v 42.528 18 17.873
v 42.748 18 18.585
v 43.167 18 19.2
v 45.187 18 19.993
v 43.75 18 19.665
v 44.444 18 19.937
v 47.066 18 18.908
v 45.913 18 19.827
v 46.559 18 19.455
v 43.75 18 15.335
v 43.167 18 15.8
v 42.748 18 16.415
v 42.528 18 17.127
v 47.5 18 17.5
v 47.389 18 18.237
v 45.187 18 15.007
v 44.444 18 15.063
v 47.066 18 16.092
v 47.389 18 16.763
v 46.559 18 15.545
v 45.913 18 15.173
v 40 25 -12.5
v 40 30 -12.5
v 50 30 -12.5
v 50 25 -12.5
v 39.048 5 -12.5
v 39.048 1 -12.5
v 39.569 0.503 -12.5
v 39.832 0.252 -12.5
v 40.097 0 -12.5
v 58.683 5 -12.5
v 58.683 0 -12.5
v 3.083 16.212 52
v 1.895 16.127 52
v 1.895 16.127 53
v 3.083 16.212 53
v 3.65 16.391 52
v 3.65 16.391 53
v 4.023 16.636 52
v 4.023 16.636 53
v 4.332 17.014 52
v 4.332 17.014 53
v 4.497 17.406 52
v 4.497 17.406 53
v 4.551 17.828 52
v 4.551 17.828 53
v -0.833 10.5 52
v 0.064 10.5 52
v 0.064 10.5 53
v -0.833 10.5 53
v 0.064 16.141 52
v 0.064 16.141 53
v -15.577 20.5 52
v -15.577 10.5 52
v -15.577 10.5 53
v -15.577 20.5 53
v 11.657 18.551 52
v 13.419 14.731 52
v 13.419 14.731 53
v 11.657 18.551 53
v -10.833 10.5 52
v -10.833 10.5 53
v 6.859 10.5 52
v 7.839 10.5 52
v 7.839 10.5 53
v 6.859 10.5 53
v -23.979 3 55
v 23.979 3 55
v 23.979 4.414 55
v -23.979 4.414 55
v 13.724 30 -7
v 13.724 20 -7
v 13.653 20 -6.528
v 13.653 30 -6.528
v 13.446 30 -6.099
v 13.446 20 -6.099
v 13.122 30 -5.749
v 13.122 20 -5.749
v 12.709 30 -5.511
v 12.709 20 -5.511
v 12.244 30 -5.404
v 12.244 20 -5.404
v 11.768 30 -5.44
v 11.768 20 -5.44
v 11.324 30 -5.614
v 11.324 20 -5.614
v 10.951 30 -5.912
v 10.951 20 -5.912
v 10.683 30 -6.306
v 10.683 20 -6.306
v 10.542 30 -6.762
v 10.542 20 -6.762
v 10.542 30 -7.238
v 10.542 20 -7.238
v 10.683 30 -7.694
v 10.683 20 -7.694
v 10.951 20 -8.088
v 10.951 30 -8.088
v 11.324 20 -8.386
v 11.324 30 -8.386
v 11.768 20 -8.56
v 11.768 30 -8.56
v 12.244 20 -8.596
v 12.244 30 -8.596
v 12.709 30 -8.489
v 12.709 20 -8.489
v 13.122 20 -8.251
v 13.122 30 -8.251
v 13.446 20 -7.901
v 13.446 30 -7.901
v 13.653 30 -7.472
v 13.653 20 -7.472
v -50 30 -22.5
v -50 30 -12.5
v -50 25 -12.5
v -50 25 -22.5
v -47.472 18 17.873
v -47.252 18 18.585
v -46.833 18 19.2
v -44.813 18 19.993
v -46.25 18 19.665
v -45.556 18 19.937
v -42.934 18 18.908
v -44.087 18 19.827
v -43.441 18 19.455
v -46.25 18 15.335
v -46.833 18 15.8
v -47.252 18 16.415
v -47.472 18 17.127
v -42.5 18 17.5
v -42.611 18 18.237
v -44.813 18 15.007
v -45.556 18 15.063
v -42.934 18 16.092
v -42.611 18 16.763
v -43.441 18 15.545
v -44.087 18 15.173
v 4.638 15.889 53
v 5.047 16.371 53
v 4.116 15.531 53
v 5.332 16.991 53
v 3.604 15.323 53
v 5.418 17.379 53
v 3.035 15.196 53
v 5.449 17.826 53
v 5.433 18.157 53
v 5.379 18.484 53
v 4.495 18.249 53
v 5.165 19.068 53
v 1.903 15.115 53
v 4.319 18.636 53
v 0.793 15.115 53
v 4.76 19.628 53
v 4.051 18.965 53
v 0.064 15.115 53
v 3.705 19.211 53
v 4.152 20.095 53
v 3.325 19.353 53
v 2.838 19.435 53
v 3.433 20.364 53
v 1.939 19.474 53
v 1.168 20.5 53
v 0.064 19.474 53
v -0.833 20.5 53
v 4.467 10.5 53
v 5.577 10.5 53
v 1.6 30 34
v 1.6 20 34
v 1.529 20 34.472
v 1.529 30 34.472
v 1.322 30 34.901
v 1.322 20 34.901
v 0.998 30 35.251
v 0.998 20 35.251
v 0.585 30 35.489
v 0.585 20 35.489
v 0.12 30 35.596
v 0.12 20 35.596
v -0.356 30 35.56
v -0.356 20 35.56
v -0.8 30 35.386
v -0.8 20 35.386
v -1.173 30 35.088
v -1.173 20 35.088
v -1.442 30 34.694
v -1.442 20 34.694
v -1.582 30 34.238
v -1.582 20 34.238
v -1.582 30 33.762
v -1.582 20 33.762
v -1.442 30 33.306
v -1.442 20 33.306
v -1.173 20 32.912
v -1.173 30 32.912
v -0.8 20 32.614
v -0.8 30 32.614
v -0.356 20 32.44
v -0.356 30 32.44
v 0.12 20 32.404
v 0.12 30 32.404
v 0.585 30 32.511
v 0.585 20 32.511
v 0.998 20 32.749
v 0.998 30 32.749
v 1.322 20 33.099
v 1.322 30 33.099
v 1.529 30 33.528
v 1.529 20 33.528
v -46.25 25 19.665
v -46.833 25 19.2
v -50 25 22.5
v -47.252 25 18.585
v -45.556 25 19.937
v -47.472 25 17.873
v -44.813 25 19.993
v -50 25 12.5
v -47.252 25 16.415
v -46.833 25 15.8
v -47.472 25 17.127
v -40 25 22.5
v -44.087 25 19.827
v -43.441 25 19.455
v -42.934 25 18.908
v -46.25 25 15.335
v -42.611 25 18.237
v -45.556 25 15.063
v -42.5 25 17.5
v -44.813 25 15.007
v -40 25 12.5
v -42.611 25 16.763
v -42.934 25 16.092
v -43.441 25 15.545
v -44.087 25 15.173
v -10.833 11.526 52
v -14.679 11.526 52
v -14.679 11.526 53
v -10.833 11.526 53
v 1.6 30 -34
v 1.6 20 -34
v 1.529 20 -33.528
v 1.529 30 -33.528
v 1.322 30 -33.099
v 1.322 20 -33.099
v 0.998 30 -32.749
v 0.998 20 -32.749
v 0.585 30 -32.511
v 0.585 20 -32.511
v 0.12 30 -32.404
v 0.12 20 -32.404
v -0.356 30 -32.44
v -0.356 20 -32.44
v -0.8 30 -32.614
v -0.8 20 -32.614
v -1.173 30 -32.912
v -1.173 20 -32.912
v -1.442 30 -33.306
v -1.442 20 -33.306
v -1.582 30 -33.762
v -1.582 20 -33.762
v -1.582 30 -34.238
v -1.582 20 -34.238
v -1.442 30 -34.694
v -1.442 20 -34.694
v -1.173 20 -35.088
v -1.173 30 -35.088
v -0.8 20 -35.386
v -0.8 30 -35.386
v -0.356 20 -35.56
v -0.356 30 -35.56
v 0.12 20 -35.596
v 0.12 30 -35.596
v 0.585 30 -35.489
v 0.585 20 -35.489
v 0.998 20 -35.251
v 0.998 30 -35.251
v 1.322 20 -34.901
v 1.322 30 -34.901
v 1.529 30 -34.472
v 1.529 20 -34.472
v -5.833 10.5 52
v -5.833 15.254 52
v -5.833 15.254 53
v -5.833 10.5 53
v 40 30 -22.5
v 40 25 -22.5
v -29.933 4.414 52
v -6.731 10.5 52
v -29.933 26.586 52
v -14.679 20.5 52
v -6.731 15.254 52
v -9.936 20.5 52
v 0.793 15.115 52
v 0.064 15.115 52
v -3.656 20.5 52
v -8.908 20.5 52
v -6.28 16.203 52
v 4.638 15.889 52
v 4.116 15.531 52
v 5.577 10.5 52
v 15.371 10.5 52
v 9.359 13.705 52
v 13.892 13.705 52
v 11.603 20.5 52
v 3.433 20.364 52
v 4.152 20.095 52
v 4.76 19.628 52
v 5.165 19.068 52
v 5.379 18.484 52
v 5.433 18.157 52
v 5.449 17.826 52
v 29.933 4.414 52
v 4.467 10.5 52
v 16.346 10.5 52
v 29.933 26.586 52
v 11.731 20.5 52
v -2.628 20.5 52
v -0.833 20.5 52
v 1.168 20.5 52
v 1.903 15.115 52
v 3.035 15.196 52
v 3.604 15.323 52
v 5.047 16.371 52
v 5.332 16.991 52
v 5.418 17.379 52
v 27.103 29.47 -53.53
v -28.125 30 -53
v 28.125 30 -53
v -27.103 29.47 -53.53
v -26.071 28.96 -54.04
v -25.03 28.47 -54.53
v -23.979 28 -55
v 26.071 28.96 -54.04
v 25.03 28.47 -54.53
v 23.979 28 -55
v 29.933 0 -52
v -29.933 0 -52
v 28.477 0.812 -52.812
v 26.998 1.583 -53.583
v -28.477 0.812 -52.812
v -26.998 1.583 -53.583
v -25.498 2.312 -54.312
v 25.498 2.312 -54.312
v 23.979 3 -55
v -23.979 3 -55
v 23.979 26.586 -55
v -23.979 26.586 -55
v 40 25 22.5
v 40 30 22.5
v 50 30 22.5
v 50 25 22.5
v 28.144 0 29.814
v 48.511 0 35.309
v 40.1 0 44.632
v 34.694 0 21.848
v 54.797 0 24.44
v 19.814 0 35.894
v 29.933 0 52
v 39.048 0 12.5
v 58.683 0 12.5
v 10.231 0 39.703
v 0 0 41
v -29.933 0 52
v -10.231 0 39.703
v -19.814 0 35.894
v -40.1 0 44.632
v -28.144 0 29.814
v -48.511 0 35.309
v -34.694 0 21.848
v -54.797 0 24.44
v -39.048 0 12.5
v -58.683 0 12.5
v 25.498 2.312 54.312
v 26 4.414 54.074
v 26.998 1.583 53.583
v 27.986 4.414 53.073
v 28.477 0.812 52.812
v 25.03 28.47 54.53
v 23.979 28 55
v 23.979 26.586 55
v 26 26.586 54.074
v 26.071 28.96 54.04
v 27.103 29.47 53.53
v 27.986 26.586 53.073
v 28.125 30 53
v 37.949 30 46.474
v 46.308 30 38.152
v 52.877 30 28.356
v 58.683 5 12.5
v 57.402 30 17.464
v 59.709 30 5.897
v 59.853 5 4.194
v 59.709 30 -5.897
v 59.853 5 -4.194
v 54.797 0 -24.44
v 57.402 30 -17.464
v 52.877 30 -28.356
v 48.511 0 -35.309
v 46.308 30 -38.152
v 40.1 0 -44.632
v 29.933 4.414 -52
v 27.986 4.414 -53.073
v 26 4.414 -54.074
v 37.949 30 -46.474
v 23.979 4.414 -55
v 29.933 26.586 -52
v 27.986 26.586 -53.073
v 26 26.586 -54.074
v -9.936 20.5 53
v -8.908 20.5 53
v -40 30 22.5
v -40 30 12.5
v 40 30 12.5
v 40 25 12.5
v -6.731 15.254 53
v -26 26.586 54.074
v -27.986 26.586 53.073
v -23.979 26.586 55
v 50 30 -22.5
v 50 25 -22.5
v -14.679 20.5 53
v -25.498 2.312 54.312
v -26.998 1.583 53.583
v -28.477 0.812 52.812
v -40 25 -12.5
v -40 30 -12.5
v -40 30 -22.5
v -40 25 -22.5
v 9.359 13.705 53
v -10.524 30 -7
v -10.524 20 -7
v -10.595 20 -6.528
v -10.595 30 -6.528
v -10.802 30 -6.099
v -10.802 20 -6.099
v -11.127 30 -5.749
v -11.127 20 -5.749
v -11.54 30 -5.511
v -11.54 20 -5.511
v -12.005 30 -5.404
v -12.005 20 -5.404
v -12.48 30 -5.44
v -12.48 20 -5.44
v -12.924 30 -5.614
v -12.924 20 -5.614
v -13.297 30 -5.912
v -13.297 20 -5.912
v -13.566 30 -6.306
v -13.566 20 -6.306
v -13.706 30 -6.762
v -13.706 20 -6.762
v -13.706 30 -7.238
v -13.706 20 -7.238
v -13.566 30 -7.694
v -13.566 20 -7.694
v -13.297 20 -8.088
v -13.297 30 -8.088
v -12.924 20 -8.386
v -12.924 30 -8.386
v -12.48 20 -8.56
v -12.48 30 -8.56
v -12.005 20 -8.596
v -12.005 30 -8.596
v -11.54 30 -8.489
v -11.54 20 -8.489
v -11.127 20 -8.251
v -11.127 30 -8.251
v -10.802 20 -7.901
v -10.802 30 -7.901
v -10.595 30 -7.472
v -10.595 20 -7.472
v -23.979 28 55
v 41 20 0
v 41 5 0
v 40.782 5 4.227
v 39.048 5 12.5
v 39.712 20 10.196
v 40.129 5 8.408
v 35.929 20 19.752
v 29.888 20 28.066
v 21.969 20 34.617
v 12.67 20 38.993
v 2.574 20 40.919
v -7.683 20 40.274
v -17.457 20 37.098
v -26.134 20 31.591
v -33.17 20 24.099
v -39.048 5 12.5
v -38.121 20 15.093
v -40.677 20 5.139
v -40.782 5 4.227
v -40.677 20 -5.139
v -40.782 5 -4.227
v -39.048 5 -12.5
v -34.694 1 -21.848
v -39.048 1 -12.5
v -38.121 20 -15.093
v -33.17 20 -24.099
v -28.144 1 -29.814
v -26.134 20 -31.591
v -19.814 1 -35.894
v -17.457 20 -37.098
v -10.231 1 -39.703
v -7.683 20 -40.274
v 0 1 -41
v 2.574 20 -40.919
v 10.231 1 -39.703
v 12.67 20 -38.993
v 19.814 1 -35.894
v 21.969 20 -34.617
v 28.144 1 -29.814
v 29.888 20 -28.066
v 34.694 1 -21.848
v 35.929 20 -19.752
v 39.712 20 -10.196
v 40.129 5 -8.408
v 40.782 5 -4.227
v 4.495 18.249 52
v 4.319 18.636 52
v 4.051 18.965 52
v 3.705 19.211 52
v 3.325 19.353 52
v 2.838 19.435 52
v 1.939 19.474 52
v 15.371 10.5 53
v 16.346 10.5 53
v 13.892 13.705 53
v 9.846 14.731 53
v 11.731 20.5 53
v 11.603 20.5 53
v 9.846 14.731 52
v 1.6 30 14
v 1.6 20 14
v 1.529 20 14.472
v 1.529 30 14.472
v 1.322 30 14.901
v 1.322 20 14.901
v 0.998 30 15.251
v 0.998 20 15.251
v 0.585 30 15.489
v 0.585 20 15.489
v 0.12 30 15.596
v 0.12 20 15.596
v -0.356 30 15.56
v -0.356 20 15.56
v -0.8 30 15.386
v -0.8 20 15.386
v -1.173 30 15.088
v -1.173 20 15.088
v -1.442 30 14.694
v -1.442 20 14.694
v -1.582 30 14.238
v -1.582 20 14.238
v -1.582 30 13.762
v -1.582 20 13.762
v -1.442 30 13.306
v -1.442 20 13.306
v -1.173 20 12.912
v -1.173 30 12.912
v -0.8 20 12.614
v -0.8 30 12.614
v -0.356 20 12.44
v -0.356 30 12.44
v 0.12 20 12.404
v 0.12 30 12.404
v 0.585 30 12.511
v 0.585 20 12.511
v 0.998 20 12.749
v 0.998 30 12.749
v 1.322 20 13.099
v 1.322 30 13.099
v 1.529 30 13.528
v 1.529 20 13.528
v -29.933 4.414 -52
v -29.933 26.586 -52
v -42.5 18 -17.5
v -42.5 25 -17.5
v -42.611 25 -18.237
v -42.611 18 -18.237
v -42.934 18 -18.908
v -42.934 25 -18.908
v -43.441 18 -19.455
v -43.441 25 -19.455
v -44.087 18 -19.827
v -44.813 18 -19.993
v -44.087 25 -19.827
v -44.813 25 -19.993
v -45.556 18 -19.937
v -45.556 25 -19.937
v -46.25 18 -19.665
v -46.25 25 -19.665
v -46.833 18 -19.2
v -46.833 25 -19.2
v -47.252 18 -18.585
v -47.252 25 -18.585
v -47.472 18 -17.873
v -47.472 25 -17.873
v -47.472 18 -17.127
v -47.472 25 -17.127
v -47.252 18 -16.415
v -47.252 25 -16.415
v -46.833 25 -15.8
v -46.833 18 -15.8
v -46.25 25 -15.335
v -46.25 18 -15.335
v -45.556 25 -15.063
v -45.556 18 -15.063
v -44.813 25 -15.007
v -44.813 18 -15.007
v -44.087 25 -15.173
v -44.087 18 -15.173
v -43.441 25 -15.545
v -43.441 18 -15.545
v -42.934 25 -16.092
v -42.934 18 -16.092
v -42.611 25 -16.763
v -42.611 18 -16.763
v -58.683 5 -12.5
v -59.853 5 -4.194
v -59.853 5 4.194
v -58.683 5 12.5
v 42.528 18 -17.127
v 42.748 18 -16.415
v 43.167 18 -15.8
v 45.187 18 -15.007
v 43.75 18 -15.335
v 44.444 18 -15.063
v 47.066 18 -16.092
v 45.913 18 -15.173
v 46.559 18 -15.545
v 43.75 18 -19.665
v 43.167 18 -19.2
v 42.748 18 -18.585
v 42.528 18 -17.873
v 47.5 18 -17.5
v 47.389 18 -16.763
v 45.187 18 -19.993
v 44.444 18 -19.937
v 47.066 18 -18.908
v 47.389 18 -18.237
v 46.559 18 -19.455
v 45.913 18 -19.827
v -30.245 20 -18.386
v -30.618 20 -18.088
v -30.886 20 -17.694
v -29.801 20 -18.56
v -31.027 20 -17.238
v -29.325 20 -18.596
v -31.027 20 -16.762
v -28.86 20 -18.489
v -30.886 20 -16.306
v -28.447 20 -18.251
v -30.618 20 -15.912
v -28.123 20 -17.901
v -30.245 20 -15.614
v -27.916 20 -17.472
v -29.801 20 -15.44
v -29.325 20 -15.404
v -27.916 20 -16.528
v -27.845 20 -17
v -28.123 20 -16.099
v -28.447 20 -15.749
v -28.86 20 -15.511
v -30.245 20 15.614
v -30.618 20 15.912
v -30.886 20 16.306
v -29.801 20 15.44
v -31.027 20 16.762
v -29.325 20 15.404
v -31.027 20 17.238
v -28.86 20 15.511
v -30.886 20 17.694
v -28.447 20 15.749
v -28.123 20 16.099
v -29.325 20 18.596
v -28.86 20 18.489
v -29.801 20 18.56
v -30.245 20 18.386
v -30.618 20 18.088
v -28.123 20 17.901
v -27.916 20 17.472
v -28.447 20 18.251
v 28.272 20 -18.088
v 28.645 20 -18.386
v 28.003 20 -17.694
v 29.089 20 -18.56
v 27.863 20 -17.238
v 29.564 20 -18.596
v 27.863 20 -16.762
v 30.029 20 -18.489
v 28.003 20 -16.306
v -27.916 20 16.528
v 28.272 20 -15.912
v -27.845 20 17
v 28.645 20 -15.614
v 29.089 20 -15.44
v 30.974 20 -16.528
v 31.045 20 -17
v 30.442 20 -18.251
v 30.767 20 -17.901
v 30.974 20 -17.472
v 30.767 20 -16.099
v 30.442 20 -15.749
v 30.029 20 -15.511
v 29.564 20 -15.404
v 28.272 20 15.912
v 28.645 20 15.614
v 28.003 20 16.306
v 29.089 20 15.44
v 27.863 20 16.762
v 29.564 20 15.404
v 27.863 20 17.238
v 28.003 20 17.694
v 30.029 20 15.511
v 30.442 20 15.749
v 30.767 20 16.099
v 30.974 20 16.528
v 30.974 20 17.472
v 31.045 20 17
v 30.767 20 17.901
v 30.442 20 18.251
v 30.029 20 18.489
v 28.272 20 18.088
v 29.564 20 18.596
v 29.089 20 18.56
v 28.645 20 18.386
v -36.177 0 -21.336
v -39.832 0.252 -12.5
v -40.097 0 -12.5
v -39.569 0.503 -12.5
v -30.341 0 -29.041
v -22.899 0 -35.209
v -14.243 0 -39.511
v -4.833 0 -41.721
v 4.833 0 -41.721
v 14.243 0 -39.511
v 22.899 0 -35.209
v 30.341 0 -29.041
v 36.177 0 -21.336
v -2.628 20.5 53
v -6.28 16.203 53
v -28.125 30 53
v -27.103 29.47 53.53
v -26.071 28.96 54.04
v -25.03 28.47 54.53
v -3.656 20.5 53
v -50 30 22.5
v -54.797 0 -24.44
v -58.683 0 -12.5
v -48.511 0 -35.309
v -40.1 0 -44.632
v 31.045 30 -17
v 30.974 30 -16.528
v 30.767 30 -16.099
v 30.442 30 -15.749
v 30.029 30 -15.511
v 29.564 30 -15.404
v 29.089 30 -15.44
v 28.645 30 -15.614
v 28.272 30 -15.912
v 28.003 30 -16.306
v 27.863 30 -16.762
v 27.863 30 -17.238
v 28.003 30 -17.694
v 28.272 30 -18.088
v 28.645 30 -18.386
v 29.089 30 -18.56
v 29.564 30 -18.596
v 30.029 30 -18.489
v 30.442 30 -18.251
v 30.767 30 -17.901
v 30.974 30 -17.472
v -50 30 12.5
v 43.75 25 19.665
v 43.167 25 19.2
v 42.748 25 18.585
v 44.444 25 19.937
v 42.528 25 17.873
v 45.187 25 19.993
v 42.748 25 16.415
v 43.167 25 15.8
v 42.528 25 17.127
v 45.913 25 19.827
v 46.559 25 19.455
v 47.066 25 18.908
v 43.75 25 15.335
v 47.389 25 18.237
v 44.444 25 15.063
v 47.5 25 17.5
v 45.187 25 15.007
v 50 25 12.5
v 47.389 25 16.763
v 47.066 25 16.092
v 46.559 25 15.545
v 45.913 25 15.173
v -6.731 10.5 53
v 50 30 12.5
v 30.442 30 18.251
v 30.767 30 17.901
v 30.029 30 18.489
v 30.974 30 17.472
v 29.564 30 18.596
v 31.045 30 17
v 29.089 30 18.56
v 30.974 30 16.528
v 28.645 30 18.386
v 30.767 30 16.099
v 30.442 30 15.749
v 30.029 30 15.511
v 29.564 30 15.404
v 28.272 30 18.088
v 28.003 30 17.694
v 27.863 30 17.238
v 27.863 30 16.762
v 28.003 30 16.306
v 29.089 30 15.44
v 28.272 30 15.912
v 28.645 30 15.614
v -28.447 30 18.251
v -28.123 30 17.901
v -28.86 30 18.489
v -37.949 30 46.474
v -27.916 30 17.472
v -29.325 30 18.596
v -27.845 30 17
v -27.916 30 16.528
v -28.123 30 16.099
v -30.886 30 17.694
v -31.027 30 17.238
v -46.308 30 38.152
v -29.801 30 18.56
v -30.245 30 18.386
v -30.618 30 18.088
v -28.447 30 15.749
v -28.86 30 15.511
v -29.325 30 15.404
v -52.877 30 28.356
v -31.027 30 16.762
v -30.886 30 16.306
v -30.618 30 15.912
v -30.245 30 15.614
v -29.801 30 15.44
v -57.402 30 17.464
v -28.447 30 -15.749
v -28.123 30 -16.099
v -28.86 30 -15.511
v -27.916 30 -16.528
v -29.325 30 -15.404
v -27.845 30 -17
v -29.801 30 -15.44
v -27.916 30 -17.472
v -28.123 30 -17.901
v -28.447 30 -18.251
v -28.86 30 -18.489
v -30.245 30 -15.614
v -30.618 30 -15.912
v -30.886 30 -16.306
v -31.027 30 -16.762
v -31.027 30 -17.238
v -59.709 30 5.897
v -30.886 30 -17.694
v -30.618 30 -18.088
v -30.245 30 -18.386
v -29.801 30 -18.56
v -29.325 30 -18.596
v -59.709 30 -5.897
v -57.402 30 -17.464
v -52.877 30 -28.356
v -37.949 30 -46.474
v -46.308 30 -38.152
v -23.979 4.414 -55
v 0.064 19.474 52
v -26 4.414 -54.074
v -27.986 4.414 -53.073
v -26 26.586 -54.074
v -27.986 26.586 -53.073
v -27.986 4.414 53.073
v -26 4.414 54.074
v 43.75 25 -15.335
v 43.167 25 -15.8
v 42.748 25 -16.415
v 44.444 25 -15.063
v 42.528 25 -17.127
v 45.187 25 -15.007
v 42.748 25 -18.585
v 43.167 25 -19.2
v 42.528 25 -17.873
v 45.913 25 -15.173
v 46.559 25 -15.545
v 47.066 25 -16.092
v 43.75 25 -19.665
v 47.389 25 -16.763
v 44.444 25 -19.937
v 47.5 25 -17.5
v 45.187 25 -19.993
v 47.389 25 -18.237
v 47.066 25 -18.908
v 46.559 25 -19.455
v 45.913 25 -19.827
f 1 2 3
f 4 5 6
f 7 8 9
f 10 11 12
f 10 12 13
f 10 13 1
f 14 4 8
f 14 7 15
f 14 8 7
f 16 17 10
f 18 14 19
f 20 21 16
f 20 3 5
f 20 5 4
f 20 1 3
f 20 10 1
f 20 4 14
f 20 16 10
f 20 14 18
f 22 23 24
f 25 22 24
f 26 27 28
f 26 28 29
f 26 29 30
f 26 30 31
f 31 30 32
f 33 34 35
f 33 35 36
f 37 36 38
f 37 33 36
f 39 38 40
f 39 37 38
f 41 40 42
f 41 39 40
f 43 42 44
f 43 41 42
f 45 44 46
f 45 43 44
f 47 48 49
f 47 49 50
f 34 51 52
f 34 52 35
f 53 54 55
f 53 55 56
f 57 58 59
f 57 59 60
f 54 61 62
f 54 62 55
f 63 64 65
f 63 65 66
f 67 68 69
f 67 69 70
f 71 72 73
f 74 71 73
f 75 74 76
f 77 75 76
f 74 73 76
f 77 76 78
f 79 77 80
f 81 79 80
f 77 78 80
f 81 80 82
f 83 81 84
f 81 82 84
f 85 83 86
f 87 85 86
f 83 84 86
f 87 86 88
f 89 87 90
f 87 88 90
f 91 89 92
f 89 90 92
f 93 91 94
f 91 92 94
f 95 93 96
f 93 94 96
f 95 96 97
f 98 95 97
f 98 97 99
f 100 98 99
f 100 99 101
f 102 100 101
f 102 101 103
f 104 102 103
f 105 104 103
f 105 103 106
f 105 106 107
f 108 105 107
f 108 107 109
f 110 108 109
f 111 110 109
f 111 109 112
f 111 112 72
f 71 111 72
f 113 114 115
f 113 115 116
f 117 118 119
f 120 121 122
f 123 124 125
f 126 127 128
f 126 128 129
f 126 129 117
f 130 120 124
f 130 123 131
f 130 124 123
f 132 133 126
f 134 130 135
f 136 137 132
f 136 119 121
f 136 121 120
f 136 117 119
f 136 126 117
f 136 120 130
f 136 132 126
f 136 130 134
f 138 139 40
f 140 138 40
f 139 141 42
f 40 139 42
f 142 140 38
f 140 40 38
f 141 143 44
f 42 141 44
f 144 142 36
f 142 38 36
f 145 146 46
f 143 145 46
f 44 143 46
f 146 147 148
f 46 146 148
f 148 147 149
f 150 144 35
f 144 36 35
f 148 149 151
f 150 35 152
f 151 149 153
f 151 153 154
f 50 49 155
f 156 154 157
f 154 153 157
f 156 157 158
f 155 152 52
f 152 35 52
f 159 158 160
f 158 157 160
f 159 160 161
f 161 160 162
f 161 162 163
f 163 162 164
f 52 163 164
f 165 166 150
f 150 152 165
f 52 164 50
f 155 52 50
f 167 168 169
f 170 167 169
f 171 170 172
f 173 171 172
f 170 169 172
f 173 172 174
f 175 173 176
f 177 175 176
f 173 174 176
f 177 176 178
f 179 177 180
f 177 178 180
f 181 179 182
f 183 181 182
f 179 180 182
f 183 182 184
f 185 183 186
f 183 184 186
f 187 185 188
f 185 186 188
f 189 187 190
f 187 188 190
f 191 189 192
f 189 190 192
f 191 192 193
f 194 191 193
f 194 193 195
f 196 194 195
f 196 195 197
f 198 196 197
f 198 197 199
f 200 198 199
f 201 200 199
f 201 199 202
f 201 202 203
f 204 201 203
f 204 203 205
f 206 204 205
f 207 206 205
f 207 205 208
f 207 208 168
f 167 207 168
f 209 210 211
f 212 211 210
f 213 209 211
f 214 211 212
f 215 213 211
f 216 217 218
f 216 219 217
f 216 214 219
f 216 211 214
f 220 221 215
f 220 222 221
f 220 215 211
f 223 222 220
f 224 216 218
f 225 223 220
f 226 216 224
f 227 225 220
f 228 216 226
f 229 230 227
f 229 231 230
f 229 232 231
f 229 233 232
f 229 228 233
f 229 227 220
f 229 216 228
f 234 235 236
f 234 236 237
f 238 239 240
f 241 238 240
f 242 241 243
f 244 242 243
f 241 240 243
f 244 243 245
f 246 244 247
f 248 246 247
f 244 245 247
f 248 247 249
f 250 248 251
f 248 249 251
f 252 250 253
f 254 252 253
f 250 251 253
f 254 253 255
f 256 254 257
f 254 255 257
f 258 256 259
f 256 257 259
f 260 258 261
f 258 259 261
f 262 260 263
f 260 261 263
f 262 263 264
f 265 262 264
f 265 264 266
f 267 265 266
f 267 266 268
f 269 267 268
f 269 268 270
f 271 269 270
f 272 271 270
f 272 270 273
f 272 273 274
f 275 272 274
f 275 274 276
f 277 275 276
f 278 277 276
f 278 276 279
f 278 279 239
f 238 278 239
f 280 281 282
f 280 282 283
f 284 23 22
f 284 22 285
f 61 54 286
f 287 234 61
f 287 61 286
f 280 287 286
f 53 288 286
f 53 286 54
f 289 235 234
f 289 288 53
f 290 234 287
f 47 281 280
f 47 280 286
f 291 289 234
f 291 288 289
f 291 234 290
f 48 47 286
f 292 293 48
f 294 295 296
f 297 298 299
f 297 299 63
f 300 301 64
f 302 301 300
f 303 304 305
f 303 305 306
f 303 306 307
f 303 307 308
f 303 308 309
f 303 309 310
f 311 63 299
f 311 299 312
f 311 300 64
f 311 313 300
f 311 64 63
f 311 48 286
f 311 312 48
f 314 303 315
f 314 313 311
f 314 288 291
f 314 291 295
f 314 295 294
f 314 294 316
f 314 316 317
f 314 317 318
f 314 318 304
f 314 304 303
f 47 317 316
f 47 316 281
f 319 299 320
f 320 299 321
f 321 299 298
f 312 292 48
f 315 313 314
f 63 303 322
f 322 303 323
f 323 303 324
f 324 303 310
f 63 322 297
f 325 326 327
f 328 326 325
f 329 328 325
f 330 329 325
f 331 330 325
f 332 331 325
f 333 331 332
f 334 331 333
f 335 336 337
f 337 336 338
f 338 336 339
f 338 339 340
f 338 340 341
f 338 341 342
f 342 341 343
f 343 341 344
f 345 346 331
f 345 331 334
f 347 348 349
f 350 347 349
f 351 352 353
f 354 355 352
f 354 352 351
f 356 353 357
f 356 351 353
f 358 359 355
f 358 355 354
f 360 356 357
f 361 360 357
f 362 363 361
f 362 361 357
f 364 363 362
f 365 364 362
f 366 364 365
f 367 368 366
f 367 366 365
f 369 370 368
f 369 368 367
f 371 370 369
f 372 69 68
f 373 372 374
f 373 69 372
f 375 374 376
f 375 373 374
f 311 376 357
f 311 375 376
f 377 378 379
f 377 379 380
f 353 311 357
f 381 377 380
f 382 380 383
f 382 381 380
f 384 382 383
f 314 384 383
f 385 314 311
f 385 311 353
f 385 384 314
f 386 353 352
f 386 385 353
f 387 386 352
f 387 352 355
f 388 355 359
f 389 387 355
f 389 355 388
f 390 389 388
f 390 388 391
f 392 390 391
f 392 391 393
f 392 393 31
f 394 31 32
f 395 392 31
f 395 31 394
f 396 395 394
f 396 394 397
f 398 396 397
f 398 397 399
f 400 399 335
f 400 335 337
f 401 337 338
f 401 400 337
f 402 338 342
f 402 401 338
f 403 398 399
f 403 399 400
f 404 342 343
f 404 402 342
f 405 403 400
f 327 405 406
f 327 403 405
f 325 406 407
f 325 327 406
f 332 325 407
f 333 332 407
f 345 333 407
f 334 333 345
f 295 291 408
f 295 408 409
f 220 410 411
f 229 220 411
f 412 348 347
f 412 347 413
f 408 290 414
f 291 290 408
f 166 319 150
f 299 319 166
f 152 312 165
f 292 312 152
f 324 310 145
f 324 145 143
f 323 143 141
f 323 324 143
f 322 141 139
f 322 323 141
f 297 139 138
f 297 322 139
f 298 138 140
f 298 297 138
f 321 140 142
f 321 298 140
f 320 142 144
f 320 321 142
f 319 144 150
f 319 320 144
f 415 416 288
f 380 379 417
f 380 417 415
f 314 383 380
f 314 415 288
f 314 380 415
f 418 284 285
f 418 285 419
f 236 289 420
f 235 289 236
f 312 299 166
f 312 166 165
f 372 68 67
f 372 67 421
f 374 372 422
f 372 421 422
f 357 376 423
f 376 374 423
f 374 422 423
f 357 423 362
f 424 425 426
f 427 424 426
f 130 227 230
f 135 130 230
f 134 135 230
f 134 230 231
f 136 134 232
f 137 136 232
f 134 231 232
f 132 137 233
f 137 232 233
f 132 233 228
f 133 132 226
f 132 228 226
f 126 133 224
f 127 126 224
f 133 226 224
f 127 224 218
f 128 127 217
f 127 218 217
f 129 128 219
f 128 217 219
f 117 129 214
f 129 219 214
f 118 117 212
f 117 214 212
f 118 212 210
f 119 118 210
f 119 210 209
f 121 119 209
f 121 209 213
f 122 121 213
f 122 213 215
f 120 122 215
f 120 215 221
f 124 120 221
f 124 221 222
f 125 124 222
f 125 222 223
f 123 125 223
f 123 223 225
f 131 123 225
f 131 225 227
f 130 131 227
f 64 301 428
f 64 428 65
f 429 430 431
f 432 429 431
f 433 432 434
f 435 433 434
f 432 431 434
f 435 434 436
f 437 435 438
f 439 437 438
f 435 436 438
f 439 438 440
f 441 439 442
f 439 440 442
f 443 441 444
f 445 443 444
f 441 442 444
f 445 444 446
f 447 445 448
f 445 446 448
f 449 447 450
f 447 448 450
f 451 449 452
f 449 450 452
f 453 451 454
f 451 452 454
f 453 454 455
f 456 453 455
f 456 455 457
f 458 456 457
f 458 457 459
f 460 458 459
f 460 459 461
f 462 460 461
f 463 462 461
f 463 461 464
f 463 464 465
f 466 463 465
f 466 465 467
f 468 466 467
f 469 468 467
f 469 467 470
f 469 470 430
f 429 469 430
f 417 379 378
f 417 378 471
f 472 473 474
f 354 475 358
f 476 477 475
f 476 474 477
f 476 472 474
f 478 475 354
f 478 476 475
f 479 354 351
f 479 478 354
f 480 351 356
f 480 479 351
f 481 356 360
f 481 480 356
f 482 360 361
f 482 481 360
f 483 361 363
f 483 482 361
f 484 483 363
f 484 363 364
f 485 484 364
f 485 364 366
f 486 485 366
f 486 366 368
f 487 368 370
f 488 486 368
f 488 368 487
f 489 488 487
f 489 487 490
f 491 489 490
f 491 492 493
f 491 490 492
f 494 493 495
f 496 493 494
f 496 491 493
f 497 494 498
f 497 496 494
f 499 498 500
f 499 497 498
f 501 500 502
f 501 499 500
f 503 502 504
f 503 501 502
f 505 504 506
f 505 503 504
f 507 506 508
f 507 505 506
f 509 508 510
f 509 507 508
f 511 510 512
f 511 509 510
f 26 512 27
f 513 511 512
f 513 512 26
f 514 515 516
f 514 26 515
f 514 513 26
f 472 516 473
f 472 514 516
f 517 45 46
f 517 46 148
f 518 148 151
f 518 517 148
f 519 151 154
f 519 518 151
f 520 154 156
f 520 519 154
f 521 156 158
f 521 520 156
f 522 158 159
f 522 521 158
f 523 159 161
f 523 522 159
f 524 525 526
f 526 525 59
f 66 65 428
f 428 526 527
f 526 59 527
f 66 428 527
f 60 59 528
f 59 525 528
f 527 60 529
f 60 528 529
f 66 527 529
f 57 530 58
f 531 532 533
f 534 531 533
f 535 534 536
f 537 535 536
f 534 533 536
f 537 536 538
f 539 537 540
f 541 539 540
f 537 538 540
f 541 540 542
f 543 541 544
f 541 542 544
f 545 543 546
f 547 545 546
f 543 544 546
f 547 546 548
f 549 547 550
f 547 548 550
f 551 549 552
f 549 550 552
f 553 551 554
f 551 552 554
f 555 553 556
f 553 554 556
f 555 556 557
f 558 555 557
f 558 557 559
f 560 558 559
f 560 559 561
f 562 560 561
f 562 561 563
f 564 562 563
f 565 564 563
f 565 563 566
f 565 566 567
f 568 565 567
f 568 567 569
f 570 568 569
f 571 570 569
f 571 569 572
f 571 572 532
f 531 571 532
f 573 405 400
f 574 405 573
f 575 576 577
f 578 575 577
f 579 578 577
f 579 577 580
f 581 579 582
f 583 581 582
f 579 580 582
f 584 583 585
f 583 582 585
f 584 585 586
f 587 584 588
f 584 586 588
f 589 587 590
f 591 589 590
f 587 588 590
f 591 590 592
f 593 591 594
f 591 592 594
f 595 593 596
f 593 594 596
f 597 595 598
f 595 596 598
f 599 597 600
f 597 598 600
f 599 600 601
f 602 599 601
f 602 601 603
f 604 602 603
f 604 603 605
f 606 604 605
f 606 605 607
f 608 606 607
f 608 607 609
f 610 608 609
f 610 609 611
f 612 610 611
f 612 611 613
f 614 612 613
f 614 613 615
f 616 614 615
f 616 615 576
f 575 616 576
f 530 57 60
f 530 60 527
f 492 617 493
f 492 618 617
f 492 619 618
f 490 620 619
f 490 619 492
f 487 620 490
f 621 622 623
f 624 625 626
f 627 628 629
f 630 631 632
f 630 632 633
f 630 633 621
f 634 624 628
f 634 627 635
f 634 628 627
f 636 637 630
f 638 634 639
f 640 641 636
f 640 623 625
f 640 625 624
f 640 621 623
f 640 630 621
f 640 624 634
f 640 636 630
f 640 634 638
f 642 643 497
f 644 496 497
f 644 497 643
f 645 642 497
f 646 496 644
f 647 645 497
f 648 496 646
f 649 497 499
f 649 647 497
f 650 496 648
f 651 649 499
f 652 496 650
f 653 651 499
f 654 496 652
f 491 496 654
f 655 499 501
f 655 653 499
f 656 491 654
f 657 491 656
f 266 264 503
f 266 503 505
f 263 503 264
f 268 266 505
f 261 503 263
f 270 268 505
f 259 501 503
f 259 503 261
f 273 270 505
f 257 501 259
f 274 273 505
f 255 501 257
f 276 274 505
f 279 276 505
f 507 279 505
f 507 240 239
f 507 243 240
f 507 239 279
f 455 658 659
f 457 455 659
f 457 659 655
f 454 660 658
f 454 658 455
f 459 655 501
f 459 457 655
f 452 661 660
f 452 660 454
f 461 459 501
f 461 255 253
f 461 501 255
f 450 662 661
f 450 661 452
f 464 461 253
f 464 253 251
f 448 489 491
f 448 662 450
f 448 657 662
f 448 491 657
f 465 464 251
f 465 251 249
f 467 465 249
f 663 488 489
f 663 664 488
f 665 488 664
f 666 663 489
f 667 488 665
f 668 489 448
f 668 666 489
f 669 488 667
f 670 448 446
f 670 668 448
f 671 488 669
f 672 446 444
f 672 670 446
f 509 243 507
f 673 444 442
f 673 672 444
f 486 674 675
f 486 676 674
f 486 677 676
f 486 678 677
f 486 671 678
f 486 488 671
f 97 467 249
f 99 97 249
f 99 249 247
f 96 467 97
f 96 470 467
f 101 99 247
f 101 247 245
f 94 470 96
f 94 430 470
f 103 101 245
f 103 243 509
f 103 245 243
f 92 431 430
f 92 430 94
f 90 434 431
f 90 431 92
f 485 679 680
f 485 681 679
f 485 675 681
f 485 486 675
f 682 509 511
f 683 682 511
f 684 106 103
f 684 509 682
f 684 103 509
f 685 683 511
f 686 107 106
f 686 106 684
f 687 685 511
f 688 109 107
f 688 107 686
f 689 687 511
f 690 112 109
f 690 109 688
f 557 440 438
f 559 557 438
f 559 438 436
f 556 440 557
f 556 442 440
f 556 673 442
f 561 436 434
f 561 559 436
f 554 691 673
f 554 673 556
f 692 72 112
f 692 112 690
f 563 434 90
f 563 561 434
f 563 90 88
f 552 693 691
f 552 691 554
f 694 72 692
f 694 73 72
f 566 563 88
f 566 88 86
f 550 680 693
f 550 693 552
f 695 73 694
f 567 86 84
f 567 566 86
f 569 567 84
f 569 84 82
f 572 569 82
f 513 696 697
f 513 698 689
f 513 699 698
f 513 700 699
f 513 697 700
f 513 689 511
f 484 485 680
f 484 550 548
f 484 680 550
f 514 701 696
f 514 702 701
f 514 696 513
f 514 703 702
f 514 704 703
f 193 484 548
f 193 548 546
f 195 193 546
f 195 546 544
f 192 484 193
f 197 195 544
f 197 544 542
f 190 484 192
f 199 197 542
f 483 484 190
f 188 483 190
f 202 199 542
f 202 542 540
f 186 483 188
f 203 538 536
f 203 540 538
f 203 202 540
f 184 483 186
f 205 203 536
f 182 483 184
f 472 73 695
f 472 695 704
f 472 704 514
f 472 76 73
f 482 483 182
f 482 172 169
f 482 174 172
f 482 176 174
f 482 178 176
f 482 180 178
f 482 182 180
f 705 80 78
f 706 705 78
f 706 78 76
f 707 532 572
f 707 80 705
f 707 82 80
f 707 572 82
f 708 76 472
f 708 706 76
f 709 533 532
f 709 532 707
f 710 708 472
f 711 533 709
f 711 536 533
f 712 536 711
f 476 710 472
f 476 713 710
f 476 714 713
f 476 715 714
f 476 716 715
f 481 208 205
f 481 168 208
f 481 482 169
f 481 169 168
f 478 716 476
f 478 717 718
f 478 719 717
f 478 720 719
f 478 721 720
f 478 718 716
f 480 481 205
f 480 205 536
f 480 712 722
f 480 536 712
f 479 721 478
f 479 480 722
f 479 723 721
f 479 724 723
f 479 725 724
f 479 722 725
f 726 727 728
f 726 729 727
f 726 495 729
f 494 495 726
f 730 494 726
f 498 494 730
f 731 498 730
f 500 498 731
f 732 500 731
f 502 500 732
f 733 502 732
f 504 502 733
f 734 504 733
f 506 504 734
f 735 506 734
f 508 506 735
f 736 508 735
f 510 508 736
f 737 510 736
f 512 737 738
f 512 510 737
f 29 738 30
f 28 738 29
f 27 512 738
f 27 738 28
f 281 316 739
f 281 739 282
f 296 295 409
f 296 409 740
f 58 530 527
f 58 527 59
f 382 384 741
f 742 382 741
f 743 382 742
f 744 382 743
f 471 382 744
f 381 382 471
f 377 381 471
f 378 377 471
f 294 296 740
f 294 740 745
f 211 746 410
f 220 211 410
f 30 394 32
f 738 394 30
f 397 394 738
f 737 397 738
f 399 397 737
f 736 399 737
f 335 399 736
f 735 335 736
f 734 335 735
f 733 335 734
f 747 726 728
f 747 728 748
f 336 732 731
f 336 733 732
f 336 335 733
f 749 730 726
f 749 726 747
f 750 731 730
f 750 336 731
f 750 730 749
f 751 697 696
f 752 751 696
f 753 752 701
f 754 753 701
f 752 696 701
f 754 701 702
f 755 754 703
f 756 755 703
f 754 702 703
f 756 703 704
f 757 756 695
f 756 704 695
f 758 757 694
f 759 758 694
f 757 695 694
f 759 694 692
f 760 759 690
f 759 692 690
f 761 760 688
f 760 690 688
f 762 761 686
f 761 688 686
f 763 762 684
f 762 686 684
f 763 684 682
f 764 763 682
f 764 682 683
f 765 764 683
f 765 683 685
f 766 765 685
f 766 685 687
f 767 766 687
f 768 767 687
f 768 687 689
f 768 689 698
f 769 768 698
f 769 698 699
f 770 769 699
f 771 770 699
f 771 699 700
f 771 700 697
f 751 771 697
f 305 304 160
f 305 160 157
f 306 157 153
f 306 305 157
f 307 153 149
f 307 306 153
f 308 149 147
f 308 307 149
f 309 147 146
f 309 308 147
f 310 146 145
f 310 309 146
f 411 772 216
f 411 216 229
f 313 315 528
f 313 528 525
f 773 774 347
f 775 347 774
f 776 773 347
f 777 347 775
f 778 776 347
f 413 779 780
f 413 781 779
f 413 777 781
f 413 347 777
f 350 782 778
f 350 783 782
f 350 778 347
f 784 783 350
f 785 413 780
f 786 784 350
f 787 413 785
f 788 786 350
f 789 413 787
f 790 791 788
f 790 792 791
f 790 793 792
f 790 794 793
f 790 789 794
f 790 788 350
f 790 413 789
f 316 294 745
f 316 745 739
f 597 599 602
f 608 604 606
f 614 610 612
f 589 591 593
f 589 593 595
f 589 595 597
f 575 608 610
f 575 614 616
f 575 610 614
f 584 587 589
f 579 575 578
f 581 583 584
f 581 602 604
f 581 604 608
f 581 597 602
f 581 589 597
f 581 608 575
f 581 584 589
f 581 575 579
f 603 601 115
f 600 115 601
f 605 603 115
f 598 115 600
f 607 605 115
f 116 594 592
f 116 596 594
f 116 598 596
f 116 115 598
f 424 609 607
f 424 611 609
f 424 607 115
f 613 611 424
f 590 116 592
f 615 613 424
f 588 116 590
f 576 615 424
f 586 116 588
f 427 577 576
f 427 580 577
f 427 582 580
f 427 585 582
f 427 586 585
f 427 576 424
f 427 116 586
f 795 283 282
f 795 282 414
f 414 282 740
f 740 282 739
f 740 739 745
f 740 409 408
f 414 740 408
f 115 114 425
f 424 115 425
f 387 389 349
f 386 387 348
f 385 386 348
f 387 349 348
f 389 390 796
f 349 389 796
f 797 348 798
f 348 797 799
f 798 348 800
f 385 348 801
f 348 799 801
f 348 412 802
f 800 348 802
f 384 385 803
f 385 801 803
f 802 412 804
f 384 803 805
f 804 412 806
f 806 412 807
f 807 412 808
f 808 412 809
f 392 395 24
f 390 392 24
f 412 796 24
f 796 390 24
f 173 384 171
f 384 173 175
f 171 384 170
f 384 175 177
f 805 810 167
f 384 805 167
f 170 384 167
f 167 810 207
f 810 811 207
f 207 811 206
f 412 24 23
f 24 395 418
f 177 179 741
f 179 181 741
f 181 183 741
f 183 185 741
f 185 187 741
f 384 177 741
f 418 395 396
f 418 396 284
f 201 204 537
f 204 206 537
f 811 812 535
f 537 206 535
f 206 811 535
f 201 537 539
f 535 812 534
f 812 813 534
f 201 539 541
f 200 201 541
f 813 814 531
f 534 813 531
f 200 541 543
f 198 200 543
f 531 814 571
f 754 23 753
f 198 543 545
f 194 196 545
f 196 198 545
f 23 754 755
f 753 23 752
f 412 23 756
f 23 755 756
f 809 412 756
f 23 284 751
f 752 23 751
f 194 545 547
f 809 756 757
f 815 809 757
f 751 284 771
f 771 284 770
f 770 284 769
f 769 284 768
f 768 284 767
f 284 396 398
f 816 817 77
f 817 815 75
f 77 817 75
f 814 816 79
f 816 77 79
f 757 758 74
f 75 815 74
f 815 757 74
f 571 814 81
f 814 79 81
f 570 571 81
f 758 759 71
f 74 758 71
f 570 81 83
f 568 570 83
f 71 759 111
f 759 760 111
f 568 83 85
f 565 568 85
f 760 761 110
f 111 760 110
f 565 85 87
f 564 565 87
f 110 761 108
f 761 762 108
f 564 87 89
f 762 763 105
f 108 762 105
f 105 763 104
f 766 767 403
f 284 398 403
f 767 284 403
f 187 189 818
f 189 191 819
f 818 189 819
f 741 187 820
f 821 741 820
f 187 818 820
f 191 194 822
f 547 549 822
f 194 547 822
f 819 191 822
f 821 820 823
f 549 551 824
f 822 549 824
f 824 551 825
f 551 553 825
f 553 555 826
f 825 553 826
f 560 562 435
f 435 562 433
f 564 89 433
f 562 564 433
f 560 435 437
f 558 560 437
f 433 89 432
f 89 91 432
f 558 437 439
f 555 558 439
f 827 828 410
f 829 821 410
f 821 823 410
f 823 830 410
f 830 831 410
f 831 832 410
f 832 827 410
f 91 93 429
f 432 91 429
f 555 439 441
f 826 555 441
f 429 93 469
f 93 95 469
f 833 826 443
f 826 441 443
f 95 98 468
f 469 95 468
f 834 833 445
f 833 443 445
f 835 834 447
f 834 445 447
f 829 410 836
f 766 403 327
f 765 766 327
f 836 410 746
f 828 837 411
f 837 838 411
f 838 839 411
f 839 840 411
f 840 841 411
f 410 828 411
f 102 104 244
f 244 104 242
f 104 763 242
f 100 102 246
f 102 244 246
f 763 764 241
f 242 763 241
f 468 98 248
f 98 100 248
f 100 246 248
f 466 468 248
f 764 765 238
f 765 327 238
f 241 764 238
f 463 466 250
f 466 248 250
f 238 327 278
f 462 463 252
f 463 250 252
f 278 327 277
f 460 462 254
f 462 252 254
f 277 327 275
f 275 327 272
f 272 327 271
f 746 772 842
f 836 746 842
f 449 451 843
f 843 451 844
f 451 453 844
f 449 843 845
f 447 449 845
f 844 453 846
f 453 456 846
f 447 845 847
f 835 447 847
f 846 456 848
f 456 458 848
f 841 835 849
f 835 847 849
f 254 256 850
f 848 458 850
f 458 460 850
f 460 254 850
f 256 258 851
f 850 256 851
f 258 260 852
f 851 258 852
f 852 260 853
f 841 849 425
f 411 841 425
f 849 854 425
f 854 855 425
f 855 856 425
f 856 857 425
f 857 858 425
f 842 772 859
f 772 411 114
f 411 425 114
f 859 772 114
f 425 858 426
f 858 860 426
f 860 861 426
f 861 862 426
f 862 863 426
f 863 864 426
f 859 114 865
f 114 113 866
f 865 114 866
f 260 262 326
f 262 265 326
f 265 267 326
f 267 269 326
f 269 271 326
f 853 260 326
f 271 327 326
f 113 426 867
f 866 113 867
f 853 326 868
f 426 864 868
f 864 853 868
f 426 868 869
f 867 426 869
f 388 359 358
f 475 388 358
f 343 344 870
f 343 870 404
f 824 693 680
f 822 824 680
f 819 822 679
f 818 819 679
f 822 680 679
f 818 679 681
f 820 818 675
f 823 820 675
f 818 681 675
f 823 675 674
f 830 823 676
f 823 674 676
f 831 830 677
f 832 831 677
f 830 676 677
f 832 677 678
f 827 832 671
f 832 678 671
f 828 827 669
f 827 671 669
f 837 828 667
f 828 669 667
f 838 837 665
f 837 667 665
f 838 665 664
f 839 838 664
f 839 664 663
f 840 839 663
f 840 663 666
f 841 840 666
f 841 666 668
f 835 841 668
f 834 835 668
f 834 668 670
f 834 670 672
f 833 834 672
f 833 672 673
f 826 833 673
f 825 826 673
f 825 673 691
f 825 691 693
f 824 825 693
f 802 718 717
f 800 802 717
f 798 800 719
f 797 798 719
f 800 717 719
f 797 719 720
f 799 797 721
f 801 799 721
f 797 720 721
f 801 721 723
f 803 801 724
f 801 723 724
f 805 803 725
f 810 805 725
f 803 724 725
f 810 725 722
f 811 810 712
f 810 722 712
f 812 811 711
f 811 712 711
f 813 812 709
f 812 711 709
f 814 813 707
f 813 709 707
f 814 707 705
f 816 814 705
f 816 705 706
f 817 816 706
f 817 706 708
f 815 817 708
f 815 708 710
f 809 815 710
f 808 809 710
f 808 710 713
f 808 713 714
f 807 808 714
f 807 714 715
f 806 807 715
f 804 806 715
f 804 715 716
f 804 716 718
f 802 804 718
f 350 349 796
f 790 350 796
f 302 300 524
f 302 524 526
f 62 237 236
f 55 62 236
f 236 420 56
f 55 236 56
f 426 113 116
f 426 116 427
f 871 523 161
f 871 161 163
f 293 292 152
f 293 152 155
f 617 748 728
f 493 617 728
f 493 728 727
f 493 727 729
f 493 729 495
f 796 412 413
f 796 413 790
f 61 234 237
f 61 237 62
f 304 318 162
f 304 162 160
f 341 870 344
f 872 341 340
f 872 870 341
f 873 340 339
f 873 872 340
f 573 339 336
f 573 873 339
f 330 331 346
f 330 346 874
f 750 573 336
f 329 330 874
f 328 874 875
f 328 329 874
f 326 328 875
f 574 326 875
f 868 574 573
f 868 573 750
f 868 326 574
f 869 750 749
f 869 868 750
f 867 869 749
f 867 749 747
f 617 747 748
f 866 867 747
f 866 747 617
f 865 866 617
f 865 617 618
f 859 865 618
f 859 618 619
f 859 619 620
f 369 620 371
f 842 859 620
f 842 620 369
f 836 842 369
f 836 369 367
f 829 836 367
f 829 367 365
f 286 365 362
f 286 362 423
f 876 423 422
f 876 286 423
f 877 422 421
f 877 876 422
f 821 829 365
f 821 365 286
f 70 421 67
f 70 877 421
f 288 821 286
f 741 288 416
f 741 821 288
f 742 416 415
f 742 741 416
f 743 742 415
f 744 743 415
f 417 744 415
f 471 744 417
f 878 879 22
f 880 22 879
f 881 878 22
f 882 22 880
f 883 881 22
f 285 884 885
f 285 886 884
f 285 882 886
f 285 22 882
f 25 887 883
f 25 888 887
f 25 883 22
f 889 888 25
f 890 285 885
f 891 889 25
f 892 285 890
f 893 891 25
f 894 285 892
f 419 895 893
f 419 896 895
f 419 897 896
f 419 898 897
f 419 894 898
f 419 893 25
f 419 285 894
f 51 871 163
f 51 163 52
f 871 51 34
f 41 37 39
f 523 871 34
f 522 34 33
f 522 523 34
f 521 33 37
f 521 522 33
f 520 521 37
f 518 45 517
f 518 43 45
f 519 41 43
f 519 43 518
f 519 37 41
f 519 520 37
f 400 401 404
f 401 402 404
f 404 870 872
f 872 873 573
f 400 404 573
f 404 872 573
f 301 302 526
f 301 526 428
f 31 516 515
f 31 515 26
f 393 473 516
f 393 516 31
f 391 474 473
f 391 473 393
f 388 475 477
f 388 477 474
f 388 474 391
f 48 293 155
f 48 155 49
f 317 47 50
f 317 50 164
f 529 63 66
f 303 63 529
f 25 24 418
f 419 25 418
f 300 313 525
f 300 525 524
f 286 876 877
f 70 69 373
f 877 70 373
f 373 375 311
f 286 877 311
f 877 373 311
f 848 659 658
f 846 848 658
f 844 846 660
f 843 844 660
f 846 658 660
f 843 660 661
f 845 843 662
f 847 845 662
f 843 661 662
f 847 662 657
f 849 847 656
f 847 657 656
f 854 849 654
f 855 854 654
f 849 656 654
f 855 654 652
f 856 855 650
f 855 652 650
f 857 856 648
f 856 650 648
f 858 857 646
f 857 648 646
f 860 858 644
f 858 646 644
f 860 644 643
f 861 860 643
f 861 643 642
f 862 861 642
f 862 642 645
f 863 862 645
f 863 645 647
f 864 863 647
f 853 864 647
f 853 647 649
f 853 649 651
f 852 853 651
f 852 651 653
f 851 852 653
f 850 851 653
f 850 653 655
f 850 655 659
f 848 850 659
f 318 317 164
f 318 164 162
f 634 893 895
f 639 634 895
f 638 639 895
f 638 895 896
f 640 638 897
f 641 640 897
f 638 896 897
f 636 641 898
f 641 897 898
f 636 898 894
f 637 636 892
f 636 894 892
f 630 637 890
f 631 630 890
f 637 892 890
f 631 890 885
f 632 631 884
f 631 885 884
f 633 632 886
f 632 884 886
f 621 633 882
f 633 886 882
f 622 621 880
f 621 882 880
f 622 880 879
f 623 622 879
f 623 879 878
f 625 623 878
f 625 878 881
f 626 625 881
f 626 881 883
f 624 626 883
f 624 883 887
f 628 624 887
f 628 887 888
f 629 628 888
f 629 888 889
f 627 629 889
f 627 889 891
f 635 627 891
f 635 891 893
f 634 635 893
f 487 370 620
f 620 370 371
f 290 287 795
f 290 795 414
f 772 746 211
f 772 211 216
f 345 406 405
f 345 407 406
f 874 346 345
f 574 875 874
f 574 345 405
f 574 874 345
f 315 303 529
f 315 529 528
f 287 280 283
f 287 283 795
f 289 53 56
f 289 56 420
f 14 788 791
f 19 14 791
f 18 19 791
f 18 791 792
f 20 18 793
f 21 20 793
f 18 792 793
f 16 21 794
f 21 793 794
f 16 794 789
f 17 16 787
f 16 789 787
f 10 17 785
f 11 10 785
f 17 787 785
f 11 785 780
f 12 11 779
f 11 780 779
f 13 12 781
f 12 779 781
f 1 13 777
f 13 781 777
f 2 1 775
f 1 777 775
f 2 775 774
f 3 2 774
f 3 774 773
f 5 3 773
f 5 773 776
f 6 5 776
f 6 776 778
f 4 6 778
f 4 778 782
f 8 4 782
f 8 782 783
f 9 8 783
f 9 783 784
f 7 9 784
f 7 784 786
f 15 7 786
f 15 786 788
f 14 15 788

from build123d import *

# Parameters (mm, degrees)
BOSS_EXTRUDE3_DEPTH      = 30
CHAMFER3_SIZE            = 2
CHAMFER4_SIZE            = 3
SKETCH5_R                = 40
CUT_EXTRUDE1_DEPTH       = 10
CHAMFER5_SIZE            = 1
SKETCH8_W                = 101.820371212
SKETCH8_H                = 22.171572876
CUT_EXTRUDE5_DEPTH       = 3
SKETCH9_W                = 3
SKETCH9_H                = 25
CUT_EXTRUDE7_DEPTH       = 5
SKETCH11_W               = 101.820371212
SKETCH11_H               = 22.171572876
CUT_EXTRUDE9_DEPTH       = 3
SKETCH12_R               = 41
CUT_EXTRUDE13_DEPTH      = 10
CUT_EXTRUDE13_DEPTH_BACK = 10
CHAMFER7_SIZE            = 1
SKETCH13_R               = 1.6
CUT_EXTRUDE14_DEPTH      = 20
SKETCH14_R               = 1.6
CUT_EXTRUDE15_DEPTH      = 20
SKETCH18_OUTSIDE_W       = 178.11
SKETCH18_OUTSIDE_H       = 148.11
SKETCH18_OUTSIDE_R       = 60
CUT_EXTRUDE16_DEPTH      = 60
BOSS_EXTRUDE6_DEPTH      = 1
SKETCH21_W               = 10
SKETCH21_H               = 10
CUT_EXTRUDE20_DEPTH      = 5
SKETCH24_R               = 2.5
CUT_EXTRUDE22_DEPTH      = 12


with BuildPart() as part:
    # Sketch2 → Boss-Extrude3 (new body)
    with BuildSketch(Plane(origin=(0, 0, 0), x_dir=(1, 0, 0), z_dir=(0, 1, 0))):
        Polygon((52.324399168, 55), (70, 40.283576004), (70, -40.283576004), (52.324399168, -55), (-52.324399168, -55), (-70, -40.283576004), (-70, 40.283576004), (-52.324399168, 55), align=None)
    extrude(amount=BOSS_EXTRUDE3_DEPTH)

    # Chamfer3
    chamfer3_edges = [part.edges().sort_by_distance(p)[0] for p in [
        (0, 30, 55),
        (61.162199584, 30, 47.641788002),
        (70, 30, 0),
        (61.162199584, 30, -47.641788002),
        (0, 30, -55),
        (-61.162199584, 30, -47.641788002),
        (-70, 30, 0),
        (-61.162199584, 30, 47.641788002),
    ]]
    chamfer(chamfer3_edges, length=CHAMFER3_SIZE)

    # Chamfer4
    chamfer4_edges = [part.edges().sort_by_distance(p)[0] for p in [
        (61.162199584, 0, 47.641788002),
        (0, 0, 55),
        (-61.162199584, 0, 47.641788002),
        (-70, 0, 0),
        (-61.162199584, 0, -47.641788002),
        (0, 0, -55),
        (61.162199584, 0, -47.641788002),
        (70, 0, 0),
    ]]
    chamfer(chamfer4_edges, length=CHAMFER4_SIZE)

    # Sketch5 → Cut-Extrude1 (cut)
    with BuildSketch(Plane.XZ):
        Circle(SKETCH5_R)
    extrude(amount=-CUT_EXTRUDE1_DEPTH, mode=Mode.SUBTRACT)

    # Chamfer5
    chamfer5_edges = [part.edges().sort_by_distance(p)[0] for p in [
        (-40, 0, 0),
    ]]
    chamfer(chamfer5_edges, length=CHAMFER5_SIZE)

    # Sketch8 → Cut-Extrude5 (cut)
    with BuildSketch(Plane.XY.offset(55)):
        with Locations((0, 15.5)):
            Rectangle(SKETCH8_W, SKETCH8_H)
    extrude(amount=-CUT_EXTRUDE5_DEPTH, mode=Mode.SUBTRACT)

    # Sketch9 → Cut-Extrude7 (cut)
    with BuildSketch(Plane.XZ):
        with BuildLine():
            Line((67, 12.5), (39.048047326, 12.5))
            ThreePointArc((39.048047326, 12.5), (40.50907269, 6.32574342), (41, 0))
            ThreePointArc((41, 0), (40.50907269, -6.32574342), (39.048047326, -12.5))
            Line((39.048047326, -12.5), (67, -12.5))
            Line((67, -12.5), (67, 12.5))
        make_face()
        with Locations((68.5, 0)):
            Rectangle(SKETCH9_W, SKETCH9_H)
        with BuildLine():
            Line((39.048047326, 12.5), (37.996710384, 12.5))
            ThreePointArc((37.996710384, 12.5), (40, 0), (37.996710384, -12.5))
            Line((37.996710384, -12.5), (39.048047326, -12.5))
            ThreePointArc((39.048047326, -12.5), (40.50907269, -6.32574342), (41, 0))
            ThreePointArc((41, 0), (40.50907269, 6.32574342), (39.048047326, 12.5))
        make_face()
        with BuildLine():
            Line((-37.996710384, 12.5), (-70, 12.5))
            Line((-70, 12.5), (-70, -12.5))
            Line((-70, -12.5), (-37.996710384, -12.5))
            ThreePointArc((-37.996710384, -12.5), (-40, 0), (-37.996710384, 12.5))
        make_face()
    extrude(amount=-CUT_EXTRUDE7_DEPTH, mode=Mode.SUBTRACT)

    # Sketch11 → Cut-Extrude9 (cut)
    with BuildSketch(Plane(origin=(0, 0, -55), x_dir=(-1, 0, 0), z_dir=(0, 0, -1))):
        with Locations((0, 15.5)):
            Rectangle(SKETCH11_W, SKETCH11_H)
    extrude(amount=-CUT_EXTRUDE9_DEPTH, mode=Mode.SUBTRACT)

    # Sketch12 → Cut-Extrude13 (cut, two sides)
    with BuildSketch(Plane.XZ.offset(-10)) as cut_extrude13_sk:
        Circle(SKETCH12_R)
    extrude(amount=CUT_EXTRUDE13_DEPTH, mode=Mode.SUBTRACT)
    extrude(cut_extrude13_sk.sketch, amount=-CUT_EXTRUDE13_DEPTH_BACK, mode=Mode.SUBTRACT)

    # Chamfer7
    chamfer7_edges = [part.edges().sort_by_distance(p)[0] for p in [
        (0, 0, -41),
    ]]
    chamfer(chamfer7_edges, length=CHAMFER7_SIZE)

    # Sketch13 → Cut-Extrude14 (cut)
    with BuildSketch(Plane.XZ.offset(-20)):
        with Locations((0, 14)):
            Circle(SKETCH13_R)
        with Locations((12.124355653, -7)):
            Circle(SKETCH13_R)
        with Locations((-12.124355653, -7)):
            Circle(SKETCH13_R)
    extrude(amount=-CUT_EXTRUDE14_DEPTH, mode=Mode.SUBTRACT)

    # Sketch14 → Cut-Extrude15 (cut)
    with BuildSketch(Plane.XZ.offset(-20)):
        with Locations((0, 34)):
            Circle(SKETCH14_R)
        with Locations((29.444863729, 17)):
            Circle(SKETCH14_R)
        with Locations((29.444863729, -17)):
            Circle(SKETCH14_R)
        with Locations((0, -34)):
            Circle(SKETCH14_R)
        with Locations((-29.444863729, -17)):
            Circle(SKETCH14_R)
        with Locations((-29.444863729, 17)):
            Circle(SKETCH14_R)
    extrude(amount=-CUT_EXTRUDE15_DEPTH, mode=Mode.SUBTRACT)

    # Sketch18 outside → Cut-Extrude16 (cut)
    with BuildSketch(Plane(origin=(0, 30, 0), x_dir=(1, 0, 0), z_dir=(0, 1, 0))):
        Rectangle(SKETCH18_OUTSIDE_W, SKETCH18_OUTSIDE_H)
        Circle(SKETCH18_OUTSIDE_R, mode=Mode.SUBTRACT)
    extrude(amount=-CUT_EXTRUDE16_DEPTH, mode=Mode.SUBTRACT)

    # Sketch19 → Boss-Extrude6 (add)
    with BuildSketch(Plane.XY.offset(52)):
        Polygon((-15.576923077, 20.5), (-14.679487179, 20.5), (-14.679487179, 11.525641026), (-10.833333333, 11.525641026), (-10.833333333, 10.5), (-15.576923077, 10.5), align=None)
        Polygon((-9.935897436, 20.5), (-8.908253205, 20.5), (-6.280048077, 16.203125), (-3.655849359, 20.5), (-2.628205128, 20.5), (-5.833333333, 15.253605769), (-5.833333333, 10.5), (-6.730769231, 10.5), (-6.730769231, 15.253605769), align=None)
        with BuildLine():
            Line((-0.833333333, 20.5), (1.16786859, 20.5))
            add(Edge.make_bspline(
                [(1.16786859, 20.5), (1.301414671, 20.499555469), (1.557837941, 20.498701919), (1.925190142, 20.493942596), (2.258981848, 20.48030158), (2.559038531, 20.46856277), (2.825354689, 20.447157224), (3.058746948, 20.426698232), (3.258140369, 20.399916344), (3.378842802, 20.375043707), (3.43349359, 20.363782051)],
                knots=[0, 0, 0, 0, 0.000400646, 0.000769285, 0.001102034, 0.001402842, 0.00167002, 0.001903434, 0.002105708, 0.002273069, 0.002273069, 0.002273069, 0.002273069], degree=3))
            add(Edge.make_bspline(
                [(3.43349359, 20.363782051), (3.506655373, 20.345705579), (3.6514182, 20.309938254), (3.85984696, 20.234339395), (4.058459314, 20.146854753), (4.246430241, 20.044101266), (4.422818216, 19.925316181), (4.589441961, 19.792550117), (4.747057571, 19.646529529), (4.8892908, 19.483572839), (5.023402376, 19.312611383), (5.136512737, 19.127743506), (5.234016965, 18.934424856), (5.311647014, 18.730689377), (5.374155509, 18.518512886), (5.418230479, 18.295973467), (5.444662444, 18.064084967), (5.447353459, 17.905919513), (5.448717949, 17.825721154)],
                knots=[0, 0, 0, 0, 0.000225945, 0.00044707, 0.000664092, 0.000876564, 0.0010888, 0.001301225, 0.001515231, 0.001732327, 0.001949488, 0.002166288, 0.002381294, 0.002598178, 0.002819412, 0.003044128, 0.003277954, 0.003518473, 0.003518473, 0.003518473, 0.003518473], degree=3))
            add(Edge.make_bspline(
                [(5.448717949, 17.825721154), (5.444520811, 17.692477998), (5.436331109, 17.43248609), (5.35997367, 17.055169286), (5.234897899, 16.703199815), (5.062545645, 16.37702085), (4.843061429, 16.082990434), (4.579276311, 15.824731991), (4.271043136, 15.608617955), (3.984102233, 15.458752798), (3.730633091, 15.362773059), (3.521966483, 15.295240606), (3.294346547, 15.243063562), (3.049954163, 15.196320328), (2.78777229, 15.161029773), (2.50842932, 15.13518236), (2.21172603, 15.119027935), (2.007900117, 15.116622207), (1.903044872, 15.115384615)],
                knots=[0, 0, 0, 0, 0.000399362, 0.000779259, 0.001149283, 0.001516695, 0.00188168, 0.00224574, 0.002619261, 0.003007206, 0.003213302, 0.003431872, 0.003664606, 0.003913302, 0.004178188, 0.004457849, 0.004754756, 0.005069316, 0.005069316, 0.005069316, 0.005069316], degree=3))
            Line((1.903044872, 15.115384615), (5.576923077, 10.5))
            Line((5.576923077, 10.5), (4.467147436, 10.5))
            Line((4.467147436, 10.5), (0.793269231, 15.115384615))
            Line((0.793269231, 15.115384615), (0.064102564, 15.115384615))
            Line((0.064102564, 15.115384615), (0.064102564, 10.5))
            Line((0.064102564, 10.5), (-0.833333333, 10.5))
            Line((-0.833333333, 10.5), (-0.833333333, 20.5))
        make_face()
        with BuildLine():
            Line((0.064102564, 19.474358974), (0.064102564, 16.141025641))
            Line((0.064102564, 16.141025641), (1.895032051, 16.127003205))
            add(Edge.make_bspline(
                [(1.895032051, 16.127003205), (1.980517877, 16.126965386), (2.146213754, 16.126892082), (2.385929939, 16.138302871), (2.609130259, 16.151283781), (2.814960979, 16.171139054), (3.003514051, 16.19672783), (3.174695232, 16.228736356), (3.328783952, 16.266027964), (3.508494061, 16.323746895), (3.709169865, 16.415192661), (3.927259751, 16.548236943), (4.112980716, 16.715577284), (4.269888894, 16.906930015), (4.395972984, 17.117319298), (4.484864567, 17.34422321), (4.541271545, 17.58191349), (4.547924532, 17.745279512), (4.551282051, 17.827724359)],
                knots=[0, 0, 0, 0, 0.000256418, 0.000497011, 0.000719809, 0.000927109, 0.001117203, 0.001290465, 0.001449339, 0.001592508, 0.00185611, 0.002109007, 0.002355881, 0.002602112, 0.002849125, 0.003088313, 0.0033308, 0.003577853, 0.003577853, 0.003577853, 0.003577853], degree=3))
            add(Edge.make_bspline(
                [(4.551282051, 17.827724359), (4.54784742, 17.908143141), (4.541041233, 18.067503823), (4.485473323, 18.300806424), (4.391503662, 18.52099771), (4.264868696, 18.727181953), (4.110585396, 18.914341198), (3.92967736, 19.074475921), (3.727091088, 19.206617249), (3.537744807, 19.291058336), (3.3685042, 19.342829345), (3.221562314, 19.379261242), (3.055529521, 19.408531153), (2.869599639, 19.431982755), (2.664566408, 19.452139739), (2.439393119, 19.46571625), (2.195573747, 19.473755861), (2.026582515, 19.474153258), (1.939102564, 19.474358974)],
                knots=[0, 0, 0, 0, 0.00024106, 0.000477692, 0.000714689, 0.000956555, 0.001201242, 0.001439631, 0.001678551, 0.001924252, 0.002058571, 0.002209185, 0.002378145, 0.002564001, 0.002771301, 0.002996098, 0.00324062, 0.003503048, 0.003503048, 0.003503048, 0.003503048], degree=3))
            Line((1.939102564, 19.474358974), (0.064102564, 19.474358974))
        make_face(mode=Mode.SUBTRACT)
        Polygon((11.730769231, 20.5), (16.346153846, 10.5), (15.370592949, 10.5), (13.892227564, 13.705128205), (9.358974359, 13.705128205), (7.838541667, 10.5), (6.858974359, 10.5), (11.602564103, 20.5), align=None)
        Polygon((11.656650641, 18.55088141), (9.845753205, 14.730769231), (13.419471154, 14.730769231), align=None, mode=Mode.SUBTRACT)
    extrude(amount=BOSS_EXTRUDE6_DEPTH)

    # Sketch21 → Cut-Extrude20 (cut)
    with BuildSketch(Plane(origin=(0, 30, 0), x_dir=(1, 0, 0), z_dir=(0, 1, 0))):
        with Locations((45, 17.5)):
            Rectangle(SKETCH21_W, SKETCH21_H)
        with Locations((-45, -17.5)):
            Rectangle(SKETCH21_W, SKETCH21_H)
        with Locations((-45, 17.5)):
            Rectangle(SKETCH21_W, SKETCH21_H)
        with Locations((45, -17.5)):
            Rectangle(SKETCH21_W, SKETCH21_H)
    extrude(amount=-CUT_EXTRUDE20_DEPTH, mode=Mode.SUBTRACT)

    # Sketch24 → Cut-Extrude22 (cut)
    with BuildSketch(Plane(origin=(0, 30, 0), x_dir=(1, 0, 0), z_dir=(0, 1, 0))):
        with Locations((-45, 17.5)):
            Circle(SKETCH24_R)
        with Locations((45, 17.5)):
            Circle(SKETCH24_R)
        with Locations((45, -17.5)):
            Circle(SKETCH24_R)
        with Locations((-45, -17.5)):
            Circle(SKETCH24_R)
    extrude(amount=-CUT_EXTRUDE22_DEPTH, mode=Mode.SUBTRACT)


solid = part.part
